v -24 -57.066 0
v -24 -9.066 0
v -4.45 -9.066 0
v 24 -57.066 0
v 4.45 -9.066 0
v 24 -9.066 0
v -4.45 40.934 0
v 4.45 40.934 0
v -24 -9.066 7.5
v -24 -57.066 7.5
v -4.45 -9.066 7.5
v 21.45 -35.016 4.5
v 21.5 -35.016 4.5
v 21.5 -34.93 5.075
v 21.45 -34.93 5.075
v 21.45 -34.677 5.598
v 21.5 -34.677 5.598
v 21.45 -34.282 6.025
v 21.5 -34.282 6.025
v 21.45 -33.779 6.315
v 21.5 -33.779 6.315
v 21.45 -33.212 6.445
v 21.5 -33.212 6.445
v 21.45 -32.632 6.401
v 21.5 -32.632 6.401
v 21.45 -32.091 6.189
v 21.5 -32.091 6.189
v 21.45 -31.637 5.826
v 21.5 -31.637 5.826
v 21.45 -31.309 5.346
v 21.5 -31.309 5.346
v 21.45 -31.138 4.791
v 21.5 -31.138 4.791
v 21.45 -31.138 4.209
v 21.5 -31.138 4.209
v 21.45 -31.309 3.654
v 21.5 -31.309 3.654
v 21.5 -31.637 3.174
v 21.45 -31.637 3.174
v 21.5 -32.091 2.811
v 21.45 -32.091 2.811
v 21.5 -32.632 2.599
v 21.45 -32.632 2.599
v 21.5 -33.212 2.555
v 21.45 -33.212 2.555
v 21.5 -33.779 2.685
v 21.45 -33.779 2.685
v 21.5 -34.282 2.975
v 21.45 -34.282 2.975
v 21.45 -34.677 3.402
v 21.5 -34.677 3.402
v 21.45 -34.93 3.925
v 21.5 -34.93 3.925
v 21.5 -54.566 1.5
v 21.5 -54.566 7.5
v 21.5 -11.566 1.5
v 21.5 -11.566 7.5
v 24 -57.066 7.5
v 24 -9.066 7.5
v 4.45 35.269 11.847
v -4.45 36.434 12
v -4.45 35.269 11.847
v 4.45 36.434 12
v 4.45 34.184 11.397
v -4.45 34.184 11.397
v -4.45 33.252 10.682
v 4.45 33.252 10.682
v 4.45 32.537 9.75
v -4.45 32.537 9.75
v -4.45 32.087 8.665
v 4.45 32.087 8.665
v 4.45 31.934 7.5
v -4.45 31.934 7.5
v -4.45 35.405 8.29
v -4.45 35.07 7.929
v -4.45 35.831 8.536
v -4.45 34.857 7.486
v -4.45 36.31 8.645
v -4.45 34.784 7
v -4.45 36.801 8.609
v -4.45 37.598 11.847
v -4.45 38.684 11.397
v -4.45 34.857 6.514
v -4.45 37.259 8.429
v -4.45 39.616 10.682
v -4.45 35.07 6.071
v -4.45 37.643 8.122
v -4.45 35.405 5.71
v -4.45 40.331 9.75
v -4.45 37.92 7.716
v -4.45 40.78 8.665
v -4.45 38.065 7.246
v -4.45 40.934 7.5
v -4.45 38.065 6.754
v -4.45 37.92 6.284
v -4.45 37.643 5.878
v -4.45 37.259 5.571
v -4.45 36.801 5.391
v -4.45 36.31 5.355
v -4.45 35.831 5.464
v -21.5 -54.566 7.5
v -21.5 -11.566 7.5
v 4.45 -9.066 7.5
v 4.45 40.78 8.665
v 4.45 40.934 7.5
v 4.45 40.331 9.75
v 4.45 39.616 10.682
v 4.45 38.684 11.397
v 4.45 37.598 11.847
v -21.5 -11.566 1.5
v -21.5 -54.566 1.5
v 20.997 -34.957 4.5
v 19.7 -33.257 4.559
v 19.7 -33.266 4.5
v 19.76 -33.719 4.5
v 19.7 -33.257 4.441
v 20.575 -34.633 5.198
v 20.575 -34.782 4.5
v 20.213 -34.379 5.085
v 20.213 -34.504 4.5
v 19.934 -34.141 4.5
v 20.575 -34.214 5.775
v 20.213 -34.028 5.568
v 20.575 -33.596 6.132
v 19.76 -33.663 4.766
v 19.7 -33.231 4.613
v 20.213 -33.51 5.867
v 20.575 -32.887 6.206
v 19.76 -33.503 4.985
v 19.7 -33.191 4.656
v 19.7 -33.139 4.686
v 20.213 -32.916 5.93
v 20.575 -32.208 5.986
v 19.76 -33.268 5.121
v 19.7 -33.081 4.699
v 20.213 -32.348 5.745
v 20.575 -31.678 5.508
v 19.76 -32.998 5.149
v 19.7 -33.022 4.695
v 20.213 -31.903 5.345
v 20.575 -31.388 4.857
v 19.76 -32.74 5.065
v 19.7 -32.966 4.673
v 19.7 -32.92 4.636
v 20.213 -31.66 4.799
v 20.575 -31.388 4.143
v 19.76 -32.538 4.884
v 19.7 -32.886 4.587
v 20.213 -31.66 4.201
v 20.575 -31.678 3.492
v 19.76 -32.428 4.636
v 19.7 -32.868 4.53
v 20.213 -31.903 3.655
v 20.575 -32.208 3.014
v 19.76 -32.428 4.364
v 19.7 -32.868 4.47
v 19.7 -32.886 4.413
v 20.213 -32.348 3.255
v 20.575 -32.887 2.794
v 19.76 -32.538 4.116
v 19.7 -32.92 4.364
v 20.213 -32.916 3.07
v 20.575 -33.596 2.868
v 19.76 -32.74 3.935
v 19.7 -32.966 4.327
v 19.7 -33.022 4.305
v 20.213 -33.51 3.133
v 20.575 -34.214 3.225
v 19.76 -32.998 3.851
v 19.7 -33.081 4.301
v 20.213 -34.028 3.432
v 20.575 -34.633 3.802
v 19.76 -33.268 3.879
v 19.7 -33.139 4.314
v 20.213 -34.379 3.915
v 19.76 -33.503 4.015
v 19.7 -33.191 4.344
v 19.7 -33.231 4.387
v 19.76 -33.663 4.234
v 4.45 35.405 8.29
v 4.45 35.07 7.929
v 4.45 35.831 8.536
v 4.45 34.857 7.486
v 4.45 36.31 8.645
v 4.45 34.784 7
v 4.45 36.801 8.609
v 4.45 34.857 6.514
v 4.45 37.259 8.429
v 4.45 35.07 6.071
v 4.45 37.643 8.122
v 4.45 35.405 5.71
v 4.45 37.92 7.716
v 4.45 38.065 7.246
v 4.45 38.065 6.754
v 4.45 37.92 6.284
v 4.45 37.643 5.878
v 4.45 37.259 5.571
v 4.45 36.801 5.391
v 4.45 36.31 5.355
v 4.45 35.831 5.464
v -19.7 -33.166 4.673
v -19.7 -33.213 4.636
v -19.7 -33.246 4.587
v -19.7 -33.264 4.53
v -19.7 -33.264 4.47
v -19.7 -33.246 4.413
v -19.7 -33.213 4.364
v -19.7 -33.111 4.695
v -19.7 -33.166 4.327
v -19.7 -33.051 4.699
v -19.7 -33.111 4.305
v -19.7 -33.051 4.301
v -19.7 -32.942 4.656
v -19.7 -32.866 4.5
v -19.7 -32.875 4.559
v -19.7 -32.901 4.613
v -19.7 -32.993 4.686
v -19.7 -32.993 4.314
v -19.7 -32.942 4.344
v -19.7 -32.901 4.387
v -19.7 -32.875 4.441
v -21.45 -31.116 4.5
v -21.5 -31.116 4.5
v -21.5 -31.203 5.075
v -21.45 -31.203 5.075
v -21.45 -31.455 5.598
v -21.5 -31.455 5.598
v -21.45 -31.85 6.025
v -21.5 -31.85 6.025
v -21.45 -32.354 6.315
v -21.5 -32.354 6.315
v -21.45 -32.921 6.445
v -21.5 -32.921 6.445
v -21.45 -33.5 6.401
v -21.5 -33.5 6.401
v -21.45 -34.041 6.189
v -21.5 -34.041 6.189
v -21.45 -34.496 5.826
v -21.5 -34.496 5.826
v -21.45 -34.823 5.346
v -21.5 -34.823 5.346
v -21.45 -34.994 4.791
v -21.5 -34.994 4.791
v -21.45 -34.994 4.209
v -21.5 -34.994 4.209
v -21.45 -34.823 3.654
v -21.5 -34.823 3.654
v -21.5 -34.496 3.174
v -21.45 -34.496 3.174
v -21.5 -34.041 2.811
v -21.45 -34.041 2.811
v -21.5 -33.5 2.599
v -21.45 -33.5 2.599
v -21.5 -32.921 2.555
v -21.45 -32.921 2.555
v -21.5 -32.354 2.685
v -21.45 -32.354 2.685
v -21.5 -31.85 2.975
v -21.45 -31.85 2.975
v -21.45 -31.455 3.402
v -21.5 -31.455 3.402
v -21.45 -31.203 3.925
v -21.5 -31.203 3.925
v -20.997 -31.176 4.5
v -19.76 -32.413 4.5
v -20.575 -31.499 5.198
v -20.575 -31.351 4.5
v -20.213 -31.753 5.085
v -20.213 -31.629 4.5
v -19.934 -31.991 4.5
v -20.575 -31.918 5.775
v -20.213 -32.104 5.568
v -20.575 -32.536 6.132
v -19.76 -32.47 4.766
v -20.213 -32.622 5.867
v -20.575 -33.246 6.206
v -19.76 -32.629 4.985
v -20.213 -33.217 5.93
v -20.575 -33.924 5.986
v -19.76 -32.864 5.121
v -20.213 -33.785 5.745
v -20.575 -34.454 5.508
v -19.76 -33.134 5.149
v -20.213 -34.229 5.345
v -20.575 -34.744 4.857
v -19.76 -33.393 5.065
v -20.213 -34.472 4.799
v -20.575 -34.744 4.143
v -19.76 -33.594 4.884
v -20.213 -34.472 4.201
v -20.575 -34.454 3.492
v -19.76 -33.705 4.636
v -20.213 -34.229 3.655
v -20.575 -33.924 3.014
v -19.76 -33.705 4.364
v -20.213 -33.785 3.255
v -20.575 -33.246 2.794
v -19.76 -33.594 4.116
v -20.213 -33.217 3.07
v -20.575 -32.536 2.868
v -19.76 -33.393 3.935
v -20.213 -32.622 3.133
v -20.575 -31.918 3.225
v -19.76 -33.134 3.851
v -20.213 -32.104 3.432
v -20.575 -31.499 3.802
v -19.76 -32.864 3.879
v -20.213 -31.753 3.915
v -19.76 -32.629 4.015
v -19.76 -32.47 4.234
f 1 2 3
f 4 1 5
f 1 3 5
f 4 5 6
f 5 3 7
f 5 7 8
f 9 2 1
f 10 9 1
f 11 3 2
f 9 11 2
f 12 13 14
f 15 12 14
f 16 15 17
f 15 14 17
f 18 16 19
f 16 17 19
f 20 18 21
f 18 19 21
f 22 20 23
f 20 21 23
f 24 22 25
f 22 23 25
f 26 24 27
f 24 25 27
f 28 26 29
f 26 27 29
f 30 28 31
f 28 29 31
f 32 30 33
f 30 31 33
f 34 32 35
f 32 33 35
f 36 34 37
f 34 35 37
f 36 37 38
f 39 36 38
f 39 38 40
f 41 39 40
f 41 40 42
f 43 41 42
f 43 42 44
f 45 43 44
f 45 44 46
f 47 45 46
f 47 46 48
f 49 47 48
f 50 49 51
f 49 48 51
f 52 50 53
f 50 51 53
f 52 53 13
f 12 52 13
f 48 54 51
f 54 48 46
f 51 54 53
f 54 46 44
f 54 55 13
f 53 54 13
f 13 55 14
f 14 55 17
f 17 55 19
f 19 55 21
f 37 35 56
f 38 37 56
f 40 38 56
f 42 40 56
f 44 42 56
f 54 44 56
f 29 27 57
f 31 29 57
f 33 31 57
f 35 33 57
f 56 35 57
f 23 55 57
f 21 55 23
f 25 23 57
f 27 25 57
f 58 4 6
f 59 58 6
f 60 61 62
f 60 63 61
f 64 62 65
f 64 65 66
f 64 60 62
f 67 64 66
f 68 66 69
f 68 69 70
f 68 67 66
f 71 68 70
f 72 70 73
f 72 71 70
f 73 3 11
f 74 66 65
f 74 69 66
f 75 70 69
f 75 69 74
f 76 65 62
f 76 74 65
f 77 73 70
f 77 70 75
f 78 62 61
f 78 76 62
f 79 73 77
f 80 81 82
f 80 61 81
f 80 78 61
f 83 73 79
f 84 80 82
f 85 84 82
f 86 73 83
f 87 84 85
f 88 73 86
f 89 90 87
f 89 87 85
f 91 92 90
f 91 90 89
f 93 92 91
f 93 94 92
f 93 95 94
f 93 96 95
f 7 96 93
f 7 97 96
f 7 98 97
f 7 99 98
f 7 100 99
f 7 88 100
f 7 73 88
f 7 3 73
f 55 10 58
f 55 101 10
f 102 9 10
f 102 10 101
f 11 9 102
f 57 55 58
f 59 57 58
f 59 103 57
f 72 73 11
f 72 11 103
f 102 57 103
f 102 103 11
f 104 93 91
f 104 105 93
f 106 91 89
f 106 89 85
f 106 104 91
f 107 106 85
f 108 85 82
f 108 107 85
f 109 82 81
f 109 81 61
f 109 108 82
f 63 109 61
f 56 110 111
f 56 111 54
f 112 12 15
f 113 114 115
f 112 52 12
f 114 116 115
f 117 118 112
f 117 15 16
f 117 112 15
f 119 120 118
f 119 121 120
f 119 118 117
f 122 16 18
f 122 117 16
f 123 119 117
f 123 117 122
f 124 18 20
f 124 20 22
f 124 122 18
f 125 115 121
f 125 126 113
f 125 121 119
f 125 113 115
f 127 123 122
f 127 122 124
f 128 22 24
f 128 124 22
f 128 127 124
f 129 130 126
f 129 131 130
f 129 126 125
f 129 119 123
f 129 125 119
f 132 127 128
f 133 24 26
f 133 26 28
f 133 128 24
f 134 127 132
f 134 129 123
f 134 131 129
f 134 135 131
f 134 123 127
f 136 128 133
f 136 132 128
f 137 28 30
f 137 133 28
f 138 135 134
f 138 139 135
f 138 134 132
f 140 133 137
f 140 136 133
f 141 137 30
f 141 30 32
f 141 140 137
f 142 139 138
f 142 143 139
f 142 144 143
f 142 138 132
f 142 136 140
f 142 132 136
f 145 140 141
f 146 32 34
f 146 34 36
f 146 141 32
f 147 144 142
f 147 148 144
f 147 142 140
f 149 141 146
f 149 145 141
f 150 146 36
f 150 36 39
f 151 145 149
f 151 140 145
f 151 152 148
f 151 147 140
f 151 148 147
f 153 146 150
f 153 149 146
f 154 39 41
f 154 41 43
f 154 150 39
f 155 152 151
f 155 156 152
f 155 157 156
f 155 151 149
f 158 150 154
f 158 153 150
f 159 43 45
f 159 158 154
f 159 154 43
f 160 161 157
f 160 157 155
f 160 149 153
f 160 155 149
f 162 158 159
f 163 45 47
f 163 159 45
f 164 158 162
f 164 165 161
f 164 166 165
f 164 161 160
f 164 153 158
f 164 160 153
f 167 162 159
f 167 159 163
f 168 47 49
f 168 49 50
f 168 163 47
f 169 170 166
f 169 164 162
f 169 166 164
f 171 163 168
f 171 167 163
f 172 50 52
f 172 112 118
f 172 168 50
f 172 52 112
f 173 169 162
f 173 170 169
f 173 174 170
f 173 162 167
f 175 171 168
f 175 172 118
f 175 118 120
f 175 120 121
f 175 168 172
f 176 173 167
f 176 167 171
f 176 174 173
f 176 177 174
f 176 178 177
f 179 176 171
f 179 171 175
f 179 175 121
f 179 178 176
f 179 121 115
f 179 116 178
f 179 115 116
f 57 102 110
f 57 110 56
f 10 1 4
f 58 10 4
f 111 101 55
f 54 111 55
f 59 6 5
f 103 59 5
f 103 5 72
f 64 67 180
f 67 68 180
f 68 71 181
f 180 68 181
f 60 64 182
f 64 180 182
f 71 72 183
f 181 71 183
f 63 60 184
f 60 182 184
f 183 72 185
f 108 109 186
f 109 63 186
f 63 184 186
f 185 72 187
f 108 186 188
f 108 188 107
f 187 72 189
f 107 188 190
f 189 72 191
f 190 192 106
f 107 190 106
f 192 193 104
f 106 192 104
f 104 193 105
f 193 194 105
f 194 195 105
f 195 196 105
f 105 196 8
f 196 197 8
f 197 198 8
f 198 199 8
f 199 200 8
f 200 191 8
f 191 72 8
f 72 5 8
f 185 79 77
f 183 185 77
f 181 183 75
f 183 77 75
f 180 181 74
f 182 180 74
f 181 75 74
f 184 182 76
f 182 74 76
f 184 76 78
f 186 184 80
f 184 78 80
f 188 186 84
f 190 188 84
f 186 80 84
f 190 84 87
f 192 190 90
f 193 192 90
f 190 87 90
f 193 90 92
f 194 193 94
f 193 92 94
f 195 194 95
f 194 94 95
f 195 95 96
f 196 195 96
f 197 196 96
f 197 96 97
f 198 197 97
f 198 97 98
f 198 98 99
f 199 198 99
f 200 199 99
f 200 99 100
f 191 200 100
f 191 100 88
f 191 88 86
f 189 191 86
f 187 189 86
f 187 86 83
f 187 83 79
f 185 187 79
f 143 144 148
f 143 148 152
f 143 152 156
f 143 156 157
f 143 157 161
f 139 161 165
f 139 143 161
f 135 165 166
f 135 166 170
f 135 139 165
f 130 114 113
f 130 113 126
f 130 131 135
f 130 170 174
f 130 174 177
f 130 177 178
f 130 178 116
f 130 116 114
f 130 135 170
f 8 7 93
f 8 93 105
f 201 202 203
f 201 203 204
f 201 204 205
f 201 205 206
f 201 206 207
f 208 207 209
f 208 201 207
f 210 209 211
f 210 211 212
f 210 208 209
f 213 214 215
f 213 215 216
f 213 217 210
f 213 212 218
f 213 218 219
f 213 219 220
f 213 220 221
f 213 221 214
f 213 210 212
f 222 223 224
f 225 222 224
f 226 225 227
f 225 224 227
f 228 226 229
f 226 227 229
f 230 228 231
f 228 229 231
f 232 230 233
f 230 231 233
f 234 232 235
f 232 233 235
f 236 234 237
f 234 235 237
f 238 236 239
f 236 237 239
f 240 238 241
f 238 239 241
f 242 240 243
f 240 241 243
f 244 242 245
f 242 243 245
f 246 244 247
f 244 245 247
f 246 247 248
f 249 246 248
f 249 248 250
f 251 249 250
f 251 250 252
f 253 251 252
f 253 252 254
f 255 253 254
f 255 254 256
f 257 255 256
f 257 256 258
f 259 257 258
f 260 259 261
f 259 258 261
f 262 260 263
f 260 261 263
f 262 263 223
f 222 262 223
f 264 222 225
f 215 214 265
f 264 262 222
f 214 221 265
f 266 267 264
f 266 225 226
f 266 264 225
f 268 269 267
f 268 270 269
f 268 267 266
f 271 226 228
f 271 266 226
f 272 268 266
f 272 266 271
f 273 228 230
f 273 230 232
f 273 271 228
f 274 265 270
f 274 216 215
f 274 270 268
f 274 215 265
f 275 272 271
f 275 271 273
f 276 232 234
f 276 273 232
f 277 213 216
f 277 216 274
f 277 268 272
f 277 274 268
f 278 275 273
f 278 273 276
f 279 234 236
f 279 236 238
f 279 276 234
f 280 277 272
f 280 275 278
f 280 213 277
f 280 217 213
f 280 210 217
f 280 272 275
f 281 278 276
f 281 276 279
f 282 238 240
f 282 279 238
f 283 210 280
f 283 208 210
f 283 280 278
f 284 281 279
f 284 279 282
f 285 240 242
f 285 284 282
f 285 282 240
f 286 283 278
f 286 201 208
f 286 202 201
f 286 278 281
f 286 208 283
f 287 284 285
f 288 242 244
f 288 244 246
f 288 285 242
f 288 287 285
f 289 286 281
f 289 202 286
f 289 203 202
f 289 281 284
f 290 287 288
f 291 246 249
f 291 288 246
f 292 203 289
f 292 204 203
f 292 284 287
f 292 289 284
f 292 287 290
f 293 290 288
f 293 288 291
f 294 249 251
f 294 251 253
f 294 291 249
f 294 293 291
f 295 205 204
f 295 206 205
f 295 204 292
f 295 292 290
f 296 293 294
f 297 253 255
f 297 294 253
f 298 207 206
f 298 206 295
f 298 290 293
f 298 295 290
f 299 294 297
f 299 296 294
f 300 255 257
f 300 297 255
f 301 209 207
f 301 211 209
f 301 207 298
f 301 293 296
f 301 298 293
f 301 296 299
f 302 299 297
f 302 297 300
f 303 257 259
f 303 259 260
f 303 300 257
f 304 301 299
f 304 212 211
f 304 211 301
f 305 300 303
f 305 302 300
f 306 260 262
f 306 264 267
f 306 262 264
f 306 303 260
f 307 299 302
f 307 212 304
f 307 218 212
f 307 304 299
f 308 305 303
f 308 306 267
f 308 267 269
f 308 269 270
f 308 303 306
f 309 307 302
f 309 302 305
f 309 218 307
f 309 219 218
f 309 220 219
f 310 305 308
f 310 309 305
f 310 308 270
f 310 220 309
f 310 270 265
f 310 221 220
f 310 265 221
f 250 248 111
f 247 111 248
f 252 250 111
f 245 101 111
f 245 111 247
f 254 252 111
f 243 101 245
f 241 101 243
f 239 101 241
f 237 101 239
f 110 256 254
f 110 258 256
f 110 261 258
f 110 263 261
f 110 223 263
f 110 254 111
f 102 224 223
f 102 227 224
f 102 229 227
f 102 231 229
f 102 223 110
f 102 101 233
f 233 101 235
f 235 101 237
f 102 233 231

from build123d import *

# Parameters (mm, degrees)
F0_W      = 8.9
F0_H      = 50
F1_DEPTH  = 7.5
F2_W      = 43
F2_H      = 43
F3_DEPTH  = 6
F4_W      = 8.9
F4_H      = 9
F5_DEPTH  = 4.5
F6_R      = 4.49999
F7_R      = 1.95
F8_DEPTH  = 1.8
F9_R      = 1.95
F10_DEPTH = 1.8
F12_D     = 3.3
F13_R     = 1.75


# Not quite as in the source:
# - a fillet or chamfer is up to 0.001 mm smaller than in the source, because OpenCascade refuses the exact size
# - a feature names something its author has since deleted; it is built from what else it names


with BuildPart() as f1:
    # F0 (on Top) → F1 (new body)
    with BuildSketch(Plane.XY):
        Polygon((-4.45, -9.0662492651), (-24, -9.0662492651), (-24, -57.0662492651), (24, -57.0662492651), (24, -9.0662492651), (4.45, -9.0662492651), align=None)
        with Locations((0, 15.9337507349)):
            Rectangle(F0_W, F0_H)
    extrude(amount=F1_DEPTH)

    # F2 (on face) → F3 (cut)
    with BuildSketch(Plane.XY.offset(7.5)):
        with Locations((0, -33.0662492651)):
            Rectangle(F2_W, F2_H)
    extrude(amount=-F3_DEPTH, mode=Mode.SUBTRACT)

    # F4 (on face) → F5 (join)
    with BuildSketch(Plane.XY.offset(7.5)):
        with Locations((0, 36.4337507349)):
            Rectangle(F4_W, F4_H)
    extrude(amount=F5_DEPTH)

    # F6 (radius 4.5 in the source; OpenCascade refuses exactly that, so slightly less here)
    f6_edges = [f1.edges().sort_by_distance(p)[0] for p in [
        (0, 40.933751, 12),
        (0, 31.933751, 12),
    ]]
    fillet(f6_edges, radius=F6_R)

    # F7 (on face) → F8 (join)
    with BuildSketch(Plane(origin=(21.5, 0, 0), x_dir=(0, -1, 0), z_dir=(-1, 0, 0))):
        with Locations((33.0662492651, 4.5)):
            Circle(F7_R)
    extrude(amount=F8_DEPTH)

    # F9 (on face) → F10 (join)
    with BuildSketch(Plane.YZ.offset(-21.5)):
        with Locations((-33.0662492651, 4.5)):
            Circle(F9_R)
    extrude(amount=F10_DEPTH)

    # F12 (through all)
    with Locations(Plane.YZ.offset(4.45)):
        with Locations((36.4337507349, 7)):
            Hole(F12_D / 2)

    # F13
    f13_edges = [f1.edges().sort_by_distance(p)[0] for p in [
        (-19.7, -35.016249, 4.5),
        (19.7, -31.116249, 4.5),
    ]]
    fillet(f13_edges, radius=F13_R)


solid = f1.part
